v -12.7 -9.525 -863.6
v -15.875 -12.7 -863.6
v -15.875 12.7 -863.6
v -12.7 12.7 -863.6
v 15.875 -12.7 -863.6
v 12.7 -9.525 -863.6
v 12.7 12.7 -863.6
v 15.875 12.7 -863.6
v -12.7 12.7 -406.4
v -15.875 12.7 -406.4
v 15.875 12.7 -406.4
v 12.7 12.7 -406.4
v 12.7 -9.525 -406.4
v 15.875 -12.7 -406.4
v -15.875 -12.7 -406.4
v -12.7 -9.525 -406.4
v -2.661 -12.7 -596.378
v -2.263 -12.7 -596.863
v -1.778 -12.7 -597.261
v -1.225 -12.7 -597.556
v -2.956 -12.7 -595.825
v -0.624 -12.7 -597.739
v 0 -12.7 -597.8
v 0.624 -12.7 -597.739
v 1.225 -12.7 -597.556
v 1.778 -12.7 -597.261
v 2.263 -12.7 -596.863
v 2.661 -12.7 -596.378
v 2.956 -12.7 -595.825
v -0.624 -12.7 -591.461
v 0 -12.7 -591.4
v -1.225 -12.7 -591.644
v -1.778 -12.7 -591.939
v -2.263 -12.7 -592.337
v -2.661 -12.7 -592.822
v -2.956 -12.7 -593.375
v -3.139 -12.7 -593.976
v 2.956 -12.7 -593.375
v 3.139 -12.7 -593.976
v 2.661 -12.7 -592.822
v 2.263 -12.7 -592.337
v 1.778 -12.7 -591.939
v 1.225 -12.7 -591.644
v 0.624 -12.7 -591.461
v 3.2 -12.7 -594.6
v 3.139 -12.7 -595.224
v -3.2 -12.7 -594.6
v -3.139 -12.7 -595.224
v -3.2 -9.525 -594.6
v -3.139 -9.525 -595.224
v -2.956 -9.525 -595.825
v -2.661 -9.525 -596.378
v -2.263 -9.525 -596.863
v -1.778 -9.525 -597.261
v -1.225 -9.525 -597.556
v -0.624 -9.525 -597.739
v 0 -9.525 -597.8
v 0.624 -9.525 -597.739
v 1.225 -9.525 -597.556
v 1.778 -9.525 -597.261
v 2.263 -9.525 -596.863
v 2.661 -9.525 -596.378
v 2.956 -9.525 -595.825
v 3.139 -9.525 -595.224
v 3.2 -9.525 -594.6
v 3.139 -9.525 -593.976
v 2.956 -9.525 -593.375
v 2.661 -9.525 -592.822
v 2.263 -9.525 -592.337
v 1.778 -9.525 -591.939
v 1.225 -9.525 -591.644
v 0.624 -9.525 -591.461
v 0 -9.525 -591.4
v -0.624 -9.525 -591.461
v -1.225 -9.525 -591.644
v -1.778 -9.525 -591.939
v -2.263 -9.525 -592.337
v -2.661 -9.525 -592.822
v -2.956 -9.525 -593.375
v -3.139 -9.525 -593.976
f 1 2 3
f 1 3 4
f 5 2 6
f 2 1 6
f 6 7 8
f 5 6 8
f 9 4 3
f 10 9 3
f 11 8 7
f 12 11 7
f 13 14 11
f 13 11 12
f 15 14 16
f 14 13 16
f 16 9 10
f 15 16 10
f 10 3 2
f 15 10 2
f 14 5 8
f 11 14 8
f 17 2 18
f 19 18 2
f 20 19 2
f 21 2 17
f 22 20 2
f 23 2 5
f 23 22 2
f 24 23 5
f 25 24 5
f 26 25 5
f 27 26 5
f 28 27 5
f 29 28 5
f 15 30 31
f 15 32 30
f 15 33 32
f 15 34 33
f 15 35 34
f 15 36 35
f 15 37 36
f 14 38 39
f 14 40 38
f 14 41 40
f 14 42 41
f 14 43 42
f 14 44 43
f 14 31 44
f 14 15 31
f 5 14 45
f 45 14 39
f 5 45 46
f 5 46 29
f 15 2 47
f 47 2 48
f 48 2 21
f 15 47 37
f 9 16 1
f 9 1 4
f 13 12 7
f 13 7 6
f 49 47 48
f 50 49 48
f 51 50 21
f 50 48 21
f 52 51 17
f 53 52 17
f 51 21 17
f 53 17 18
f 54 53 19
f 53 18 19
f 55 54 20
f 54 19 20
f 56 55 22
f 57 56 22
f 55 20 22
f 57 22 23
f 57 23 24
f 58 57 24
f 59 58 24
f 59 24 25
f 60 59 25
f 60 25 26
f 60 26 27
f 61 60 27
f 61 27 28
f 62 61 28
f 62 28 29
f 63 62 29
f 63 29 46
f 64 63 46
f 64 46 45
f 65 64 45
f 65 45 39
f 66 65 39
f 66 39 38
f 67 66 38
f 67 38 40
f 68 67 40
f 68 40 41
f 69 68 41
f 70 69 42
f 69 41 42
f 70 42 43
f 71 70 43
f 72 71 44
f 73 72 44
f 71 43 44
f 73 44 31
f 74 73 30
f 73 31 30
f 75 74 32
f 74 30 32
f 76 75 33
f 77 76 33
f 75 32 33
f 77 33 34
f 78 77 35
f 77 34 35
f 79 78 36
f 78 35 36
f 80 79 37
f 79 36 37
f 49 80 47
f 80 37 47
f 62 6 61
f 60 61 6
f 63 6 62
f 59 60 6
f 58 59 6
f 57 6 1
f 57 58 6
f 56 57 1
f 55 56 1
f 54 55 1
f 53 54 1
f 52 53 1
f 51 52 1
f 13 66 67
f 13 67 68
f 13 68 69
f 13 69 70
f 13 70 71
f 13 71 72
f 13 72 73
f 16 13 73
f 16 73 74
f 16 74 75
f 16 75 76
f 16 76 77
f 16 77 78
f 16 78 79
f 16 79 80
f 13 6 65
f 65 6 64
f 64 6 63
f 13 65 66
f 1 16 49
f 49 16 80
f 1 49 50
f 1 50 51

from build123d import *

# Parameters (mm, degrees)
BOSS_EXTRUDE2_DEPTH  = 609.6
CUT_EXTRUDE1_DEPTH   = 1016
M6_CLEARANCE_HOLE1_D = 6.4
BOSS_EXTRUDE3_DEPTH  = 254


with BuildPart() as part:
    # Sketch3 → Boss-Extrude2 (new, symmetric)
    with BuildSketch(Plane.XY):
        Polygon((-15.875, 12.7), (-15.875, -12.7), (15.875, -12.7), (15.875, 12.7), (12.7, 12.7), (12.7, -9.525), (-12.7, -9.525), (-12.7, 12.7), align=None)
    extrude(amount=BOSS_EXTRUDE2_DEPTH, both=True)

    # Sketch5 → Cut-Extrude1 (cut)
    with BuildSketch(Plane.XY.offset(609.6)):
        Polygon((-15.875, 12.7), (-12.7, 12.7), (-12.7, -9.525), (12.7, -9.525), (12.7, 12.7), (15.875, 12.7), (15.875, -12.7), (-15.875, -12.7), align=None)
    extrude(amount=-CUT_EXTRUDE1_DEPTH, mode=Mode.SUBTRACT)

    # M6 Clearance Hole1 (through all)
    with Locations(Plane(origin=(0, -9.525, 0), x_dir=(1, 0, 0), z_dir=(0, 1, 0))):
        with Locations((0, 594.6)):
            Hole(M6_CLEARANCE_HOLE1_D / 2)

    # Sketch8 → Boss-Extrude3 (add)
    with BuildSketch(Plane(origin=(0, 0, -609.6), x_dir=(-1, 0, 0), z_dir=(0, 0, -1))):
        Polygon((-15.875, 12.7), (-12.7, 12.7), (-12.7, -9.525), (12.7, -9.525), (12.7, 12.7), (15.875, 12.7), (15.875, -12.7), (-15.875, -12.7), align=None)
    extrude(amount=BOSS_EXTRUDE3_DEPTH)


solid = part.part
